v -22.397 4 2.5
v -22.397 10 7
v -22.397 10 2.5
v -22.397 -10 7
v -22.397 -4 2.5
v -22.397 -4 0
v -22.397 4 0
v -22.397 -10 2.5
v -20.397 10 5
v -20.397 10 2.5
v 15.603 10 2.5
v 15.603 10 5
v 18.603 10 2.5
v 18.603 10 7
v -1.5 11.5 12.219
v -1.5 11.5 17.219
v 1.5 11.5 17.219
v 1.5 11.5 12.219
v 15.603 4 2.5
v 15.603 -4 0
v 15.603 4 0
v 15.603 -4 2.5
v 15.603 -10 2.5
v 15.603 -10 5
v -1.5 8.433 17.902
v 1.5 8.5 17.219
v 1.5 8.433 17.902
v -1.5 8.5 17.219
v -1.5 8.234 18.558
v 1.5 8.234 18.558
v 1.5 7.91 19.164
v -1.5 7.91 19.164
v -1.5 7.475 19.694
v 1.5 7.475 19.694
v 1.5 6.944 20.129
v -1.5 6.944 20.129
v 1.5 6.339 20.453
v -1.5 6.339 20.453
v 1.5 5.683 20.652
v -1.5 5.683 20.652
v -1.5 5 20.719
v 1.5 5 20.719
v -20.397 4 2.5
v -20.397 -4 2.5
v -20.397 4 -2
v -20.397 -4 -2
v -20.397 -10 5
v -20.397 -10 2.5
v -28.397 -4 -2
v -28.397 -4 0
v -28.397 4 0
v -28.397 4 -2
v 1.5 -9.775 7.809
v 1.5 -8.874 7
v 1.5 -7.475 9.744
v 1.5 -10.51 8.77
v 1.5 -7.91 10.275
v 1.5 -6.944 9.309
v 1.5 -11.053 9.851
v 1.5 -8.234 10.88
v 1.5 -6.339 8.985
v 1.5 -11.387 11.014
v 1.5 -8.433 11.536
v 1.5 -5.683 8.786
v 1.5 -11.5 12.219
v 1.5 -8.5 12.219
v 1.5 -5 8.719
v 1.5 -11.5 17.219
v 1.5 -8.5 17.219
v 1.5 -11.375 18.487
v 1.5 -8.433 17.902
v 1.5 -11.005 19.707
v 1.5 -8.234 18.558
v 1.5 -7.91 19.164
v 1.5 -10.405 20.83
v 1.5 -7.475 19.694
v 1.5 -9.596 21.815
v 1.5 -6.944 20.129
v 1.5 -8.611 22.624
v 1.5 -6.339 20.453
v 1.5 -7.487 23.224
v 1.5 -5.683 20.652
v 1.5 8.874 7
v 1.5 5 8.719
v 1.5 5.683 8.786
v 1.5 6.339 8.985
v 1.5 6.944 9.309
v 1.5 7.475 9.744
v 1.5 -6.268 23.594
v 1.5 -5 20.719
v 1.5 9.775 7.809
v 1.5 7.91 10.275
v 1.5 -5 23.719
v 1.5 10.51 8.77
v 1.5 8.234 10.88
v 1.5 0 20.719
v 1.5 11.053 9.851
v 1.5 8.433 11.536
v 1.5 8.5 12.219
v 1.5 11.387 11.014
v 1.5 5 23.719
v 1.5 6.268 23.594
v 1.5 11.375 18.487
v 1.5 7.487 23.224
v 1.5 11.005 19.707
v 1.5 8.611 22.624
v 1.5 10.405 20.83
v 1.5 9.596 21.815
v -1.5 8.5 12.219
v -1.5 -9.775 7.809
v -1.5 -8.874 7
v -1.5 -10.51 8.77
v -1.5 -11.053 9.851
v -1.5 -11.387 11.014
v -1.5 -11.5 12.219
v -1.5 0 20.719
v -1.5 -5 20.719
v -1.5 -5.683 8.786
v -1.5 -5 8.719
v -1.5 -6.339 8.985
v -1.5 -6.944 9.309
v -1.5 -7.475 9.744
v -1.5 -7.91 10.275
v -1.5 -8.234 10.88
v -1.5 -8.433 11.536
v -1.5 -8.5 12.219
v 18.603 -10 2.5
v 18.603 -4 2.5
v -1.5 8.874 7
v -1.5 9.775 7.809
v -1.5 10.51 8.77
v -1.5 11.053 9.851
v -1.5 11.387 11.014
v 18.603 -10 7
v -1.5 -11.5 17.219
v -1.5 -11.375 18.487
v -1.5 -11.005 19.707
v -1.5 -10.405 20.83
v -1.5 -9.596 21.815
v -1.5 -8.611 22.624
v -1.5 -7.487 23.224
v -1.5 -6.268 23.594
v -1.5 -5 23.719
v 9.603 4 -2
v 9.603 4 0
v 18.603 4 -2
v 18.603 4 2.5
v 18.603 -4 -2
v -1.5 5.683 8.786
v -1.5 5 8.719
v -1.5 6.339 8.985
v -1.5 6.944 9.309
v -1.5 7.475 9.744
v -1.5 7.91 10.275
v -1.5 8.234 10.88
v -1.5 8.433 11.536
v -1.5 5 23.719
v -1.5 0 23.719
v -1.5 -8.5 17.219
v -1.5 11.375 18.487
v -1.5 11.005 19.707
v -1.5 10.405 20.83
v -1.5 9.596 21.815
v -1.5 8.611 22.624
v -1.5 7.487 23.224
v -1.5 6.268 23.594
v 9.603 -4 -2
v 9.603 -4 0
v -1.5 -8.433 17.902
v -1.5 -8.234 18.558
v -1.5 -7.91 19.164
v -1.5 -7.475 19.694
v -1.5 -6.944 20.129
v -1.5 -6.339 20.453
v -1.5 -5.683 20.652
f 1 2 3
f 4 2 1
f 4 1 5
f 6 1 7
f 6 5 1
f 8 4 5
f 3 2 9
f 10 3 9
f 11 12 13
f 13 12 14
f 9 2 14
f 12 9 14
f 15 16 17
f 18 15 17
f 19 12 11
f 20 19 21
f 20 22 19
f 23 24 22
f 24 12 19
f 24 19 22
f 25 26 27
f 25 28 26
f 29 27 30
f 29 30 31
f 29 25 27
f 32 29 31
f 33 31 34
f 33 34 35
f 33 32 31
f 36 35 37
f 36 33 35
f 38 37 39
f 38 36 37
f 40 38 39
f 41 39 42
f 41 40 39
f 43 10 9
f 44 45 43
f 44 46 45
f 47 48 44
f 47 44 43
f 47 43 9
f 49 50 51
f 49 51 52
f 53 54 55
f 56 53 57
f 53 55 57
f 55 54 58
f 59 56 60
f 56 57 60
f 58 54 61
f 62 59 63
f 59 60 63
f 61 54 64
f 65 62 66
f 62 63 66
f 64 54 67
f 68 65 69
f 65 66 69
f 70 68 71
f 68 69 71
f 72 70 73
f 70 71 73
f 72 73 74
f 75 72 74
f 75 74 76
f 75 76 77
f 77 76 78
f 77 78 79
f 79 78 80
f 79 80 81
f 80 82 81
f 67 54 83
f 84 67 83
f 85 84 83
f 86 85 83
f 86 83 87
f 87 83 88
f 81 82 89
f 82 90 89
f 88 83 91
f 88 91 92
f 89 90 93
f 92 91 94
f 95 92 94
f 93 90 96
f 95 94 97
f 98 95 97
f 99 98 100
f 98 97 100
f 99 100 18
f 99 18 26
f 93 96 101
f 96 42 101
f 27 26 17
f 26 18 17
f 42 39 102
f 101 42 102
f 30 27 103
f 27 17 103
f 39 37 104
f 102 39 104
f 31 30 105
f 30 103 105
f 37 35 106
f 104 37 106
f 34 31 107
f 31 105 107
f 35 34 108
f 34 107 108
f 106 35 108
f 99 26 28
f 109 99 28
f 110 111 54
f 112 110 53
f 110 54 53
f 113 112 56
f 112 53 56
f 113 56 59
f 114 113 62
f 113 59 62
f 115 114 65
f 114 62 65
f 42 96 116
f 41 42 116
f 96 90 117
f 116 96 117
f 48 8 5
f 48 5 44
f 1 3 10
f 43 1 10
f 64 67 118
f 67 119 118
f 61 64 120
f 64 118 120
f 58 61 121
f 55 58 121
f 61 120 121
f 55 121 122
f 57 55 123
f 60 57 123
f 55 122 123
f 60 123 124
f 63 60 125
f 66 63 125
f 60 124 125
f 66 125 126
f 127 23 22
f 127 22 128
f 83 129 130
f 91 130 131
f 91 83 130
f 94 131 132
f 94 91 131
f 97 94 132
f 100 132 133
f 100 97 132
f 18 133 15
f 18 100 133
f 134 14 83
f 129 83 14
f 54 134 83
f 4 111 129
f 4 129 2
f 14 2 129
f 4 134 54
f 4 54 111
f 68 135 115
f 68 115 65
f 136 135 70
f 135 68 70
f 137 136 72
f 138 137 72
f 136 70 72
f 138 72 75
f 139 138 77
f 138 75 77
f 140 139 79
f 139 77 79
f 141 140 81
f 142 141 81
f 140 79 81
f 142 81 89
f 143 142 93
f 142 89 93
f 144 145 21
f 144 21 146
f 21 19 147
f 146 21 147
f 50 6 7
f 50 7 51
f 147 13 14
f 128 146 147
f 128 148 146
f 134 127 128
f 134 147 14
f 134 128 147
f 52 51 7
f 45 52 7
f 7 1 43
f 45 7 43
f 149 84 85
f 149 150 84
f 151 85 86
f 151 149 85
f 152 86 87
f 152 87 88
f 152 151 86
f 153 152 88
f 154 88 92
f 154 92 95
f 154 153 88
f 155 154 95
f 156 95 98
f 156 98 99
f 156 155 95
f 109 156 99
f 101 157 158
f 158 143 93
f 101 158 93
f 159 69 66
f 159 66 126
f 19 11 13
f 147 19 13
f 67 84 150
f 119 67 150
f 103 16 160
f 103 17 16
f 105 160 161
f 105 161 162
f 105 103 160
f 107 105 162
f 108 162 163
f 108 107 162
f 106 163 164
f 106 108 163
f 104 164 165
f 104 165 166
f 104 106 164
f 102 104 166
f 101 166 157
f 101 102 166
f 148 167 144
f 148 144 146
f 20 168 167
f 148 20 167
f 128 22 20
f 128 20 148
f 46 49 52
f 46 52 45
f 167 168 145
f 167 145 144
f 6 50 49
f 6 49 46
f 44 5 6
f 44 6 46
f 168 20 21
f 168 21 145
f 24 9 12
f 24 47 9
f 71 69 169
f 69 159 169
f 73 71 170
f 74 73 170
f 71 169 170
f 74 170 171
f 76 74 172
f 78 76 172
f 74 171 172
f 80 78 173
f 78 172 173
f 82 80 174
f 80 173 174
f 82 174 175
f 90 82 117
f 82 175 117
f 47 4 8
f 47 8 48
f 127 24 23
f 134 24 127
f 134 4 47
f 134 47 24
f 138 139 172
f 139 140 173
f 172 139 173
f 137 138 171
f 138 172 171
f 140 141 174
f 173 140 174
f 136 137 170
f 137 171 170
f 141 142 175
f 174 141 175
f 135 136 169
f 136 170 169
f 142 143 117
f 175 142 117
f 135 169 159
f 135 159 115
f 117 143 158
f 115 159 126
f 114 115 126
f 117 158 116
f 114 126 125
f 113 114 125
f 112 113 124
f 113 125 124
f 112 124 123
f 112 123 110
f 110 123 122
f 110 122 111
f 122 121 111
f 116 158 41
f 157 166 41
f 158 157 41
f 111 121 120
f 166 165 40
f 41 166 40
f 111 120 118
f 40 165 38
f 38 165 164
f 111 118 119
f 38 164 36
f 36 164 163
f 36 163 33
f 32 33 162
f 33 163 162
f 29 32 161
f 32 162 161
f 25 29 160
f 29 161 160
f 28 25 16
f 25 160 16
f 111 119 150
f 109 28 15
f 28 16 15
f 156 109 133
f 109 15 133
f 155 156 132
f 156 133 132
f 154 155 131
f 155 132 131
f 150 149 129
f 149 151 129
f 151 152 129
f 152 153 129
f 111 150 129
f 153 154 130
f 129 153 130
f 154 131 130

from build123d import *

# Parameters (mm, degrees)
F1_DEPTH = 10
F3_DEPTH = 6
F2_W     = 2
F2_H     = 2.5
F2_W_2   = 3
F4_DEPTH = 6
F6_W     = 3
F6_H     = 3


with BuildPart() as f1:
    # F0 (on Front) → F1 (new body)
    with BuildSketch(Plane.XZ):
        Polygon((-22.397178, 0), (-28.397178, 0), (-28.397178, -2), (-20.397178, -2), (-20.397178, 5), (13.602822, 5), (15.602822, 5), (15.602822, 0), (9.602822, 0), (9.602822, -2), (18.602822, -2), (18.602822, 7), (-22.397178, 7), align=None)
    extrude(amount=F1_DEPTH)

    # F2 (on face) → F3 (cut)
    with BuildSketch(Plane.XZ.offset(10)):
        Polygon((-20.397178, 0), (-22.397178, 0), (-28.397178, 0), (-28.397178, -2), (-20.397178, -2), align=None)
        Polygon((18.602822, -2), (18.602822, 0), (15.602822, 0), (9.602822, 0), (9.602822, -2), align=None)
    extrude(amount=-F3_DEPTH, mode=Mode.SUBTRACT)

    # F2 (on face) → F4 (cut)
    with BuildSketch(Plane.XZ.offset(10)):
        with Locations((-21.397178, 1.25)):
            Rectangle(F2_W, F2_H)
        with Locations((17.102822, 1.25)):
            Rectangle(F2_W_2, F2_H)
    extrude(amount=-F4_DEPTH, mode=Mode.SUBTRACT)

    # F7: sweep along a path in F5
    with BuildLine(Plane.YZ) as f7_path:
        Line((0, 7.219068), (-5, 7.219068))
        ThreePointArc((-5, 7.219068), (-8.535534, 8.683534), (-10, 12.219068))
        Line((-10, 12.219068), (-10, 17.219068))
        ThreePointArc((-10, 17.219068), (-8.535534, 20.754602), (-5, 22.219068))
        Line((-5, 22.219068), (0, 22.219068))
    # F6 (on Front) → F7 (sweep)
    with BuildSketch(Plane.XZ):
        with Locations((0, 7.219068)):
            Rectangle(F6_W, F6_H)
    sweep(path=f7_path.line)

    # F8: F1 across plane


with BuildPart() as f1_1:
    add(f1.part)
    add(f1.part.mirror(Plane.XZ))


solid = f1_1.part
